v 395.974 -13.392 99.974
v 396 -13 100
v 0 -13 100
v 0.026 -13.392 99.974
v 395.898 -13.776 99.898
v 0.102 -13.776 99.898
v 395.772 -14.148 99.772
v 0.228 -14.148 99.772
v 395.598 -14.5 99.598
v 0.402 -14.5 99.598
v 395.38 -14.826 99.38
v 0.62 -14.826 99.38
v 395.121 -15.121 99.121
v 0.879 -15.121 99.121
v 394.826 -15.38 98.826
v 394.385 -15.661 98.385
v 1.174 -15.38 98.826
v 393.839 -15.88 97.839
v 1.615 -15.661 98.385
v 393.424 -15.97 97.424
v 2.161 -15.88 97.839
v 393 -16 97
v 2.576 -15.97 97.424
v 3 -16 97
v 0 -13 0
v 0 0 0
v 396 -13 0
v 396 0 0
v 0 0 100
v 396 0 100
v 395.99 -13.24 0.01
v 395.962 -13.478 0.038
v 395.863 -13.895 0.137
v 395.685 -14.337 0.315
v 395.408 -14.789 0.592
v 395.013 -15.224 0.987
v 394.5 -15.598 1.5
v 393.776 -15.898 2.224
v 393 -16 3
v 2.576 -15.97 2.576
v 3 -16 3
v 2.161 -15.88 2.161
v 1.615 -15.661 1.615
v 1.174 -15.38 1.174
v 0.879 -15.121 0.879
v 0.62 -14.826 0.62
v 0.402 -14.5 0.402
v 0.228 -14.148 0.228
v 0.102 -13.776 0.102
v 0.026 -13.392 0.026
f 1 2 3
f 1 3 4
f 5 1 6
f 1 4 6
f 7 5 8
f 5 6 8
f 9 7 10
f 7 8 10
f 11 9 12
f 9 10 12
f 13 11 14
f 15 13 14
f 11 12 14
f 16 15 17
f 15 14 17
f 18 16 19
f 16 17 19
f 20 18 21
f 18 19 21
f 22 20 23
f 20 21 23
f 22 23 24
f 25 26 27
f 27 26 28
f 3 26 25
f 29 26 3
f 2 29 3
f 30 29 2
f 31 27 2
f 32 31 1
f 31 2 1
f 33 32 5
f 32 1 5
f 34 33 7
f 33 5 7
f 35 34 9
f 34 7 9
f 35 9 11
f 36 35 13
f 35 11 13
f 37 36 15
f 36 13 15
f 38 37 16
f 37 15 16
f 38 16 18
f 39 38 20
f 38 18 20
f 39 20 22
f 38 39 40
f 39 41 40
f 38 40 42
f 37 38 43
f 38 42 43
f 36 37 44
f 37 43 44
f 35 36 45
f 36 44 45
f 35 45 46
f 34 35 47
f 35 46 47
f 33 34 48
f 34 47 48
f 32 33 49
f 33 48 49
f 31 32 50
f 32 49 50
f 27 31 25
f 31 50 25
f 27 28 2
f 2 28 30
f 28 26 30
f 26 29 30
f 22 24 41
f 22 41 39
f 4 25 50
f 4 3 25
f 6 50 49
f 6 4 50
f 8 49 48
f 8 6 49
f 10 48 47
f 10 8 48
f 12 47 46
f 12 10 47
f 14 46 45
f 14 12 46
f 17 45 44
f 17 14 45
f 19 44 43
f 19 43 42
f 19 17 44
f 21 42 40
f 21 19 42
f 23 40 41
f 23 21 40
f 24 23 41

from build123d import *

# Parameters (mm, degrees)
F0_W     = 53.6684691906
F0_H     = 36.3845862448
F1_DEPTH = 16
F2_DEPTH = 396
F3_DEPTH = 100
F4_R     = 3


with BuildPart() as f1:
    # F0 (on Front) → F1 (new body)
    with BuildSketch(Plane.XZ):
        with Locations((26.8342345953, 18.1922931224)):
            Rectangle(F0_W, F0_H)
    extrude(amount=F1_DEPTH)

    # F2 (add): a face of the model
    f2_faces = [f1.faces().sort_by_distance(p)[0] for p in [
        (0, -8, 18.1922931224),
    ]]
    extrude(f2_faces, amount=-F2_DEPTH)

    # F3 (add): a face of the model
    f3_faces = [f1.faces().sort_by_distance(p)[0] for p in [
        (198, -8, 0),
    ]]
    extrude(f3_faces, amount=-F3_DEPTH)

    # F4
    f4_edges = [f1.edges().sort_by_distance(p)[0] for p in [
        (0, -16, 50),
        (198, -16, 0),
        (396, -16, 50),
        (198, -16, 100),
    ]]
    fillet(f4_edges, radius=F4_R)


solid = f1.part
